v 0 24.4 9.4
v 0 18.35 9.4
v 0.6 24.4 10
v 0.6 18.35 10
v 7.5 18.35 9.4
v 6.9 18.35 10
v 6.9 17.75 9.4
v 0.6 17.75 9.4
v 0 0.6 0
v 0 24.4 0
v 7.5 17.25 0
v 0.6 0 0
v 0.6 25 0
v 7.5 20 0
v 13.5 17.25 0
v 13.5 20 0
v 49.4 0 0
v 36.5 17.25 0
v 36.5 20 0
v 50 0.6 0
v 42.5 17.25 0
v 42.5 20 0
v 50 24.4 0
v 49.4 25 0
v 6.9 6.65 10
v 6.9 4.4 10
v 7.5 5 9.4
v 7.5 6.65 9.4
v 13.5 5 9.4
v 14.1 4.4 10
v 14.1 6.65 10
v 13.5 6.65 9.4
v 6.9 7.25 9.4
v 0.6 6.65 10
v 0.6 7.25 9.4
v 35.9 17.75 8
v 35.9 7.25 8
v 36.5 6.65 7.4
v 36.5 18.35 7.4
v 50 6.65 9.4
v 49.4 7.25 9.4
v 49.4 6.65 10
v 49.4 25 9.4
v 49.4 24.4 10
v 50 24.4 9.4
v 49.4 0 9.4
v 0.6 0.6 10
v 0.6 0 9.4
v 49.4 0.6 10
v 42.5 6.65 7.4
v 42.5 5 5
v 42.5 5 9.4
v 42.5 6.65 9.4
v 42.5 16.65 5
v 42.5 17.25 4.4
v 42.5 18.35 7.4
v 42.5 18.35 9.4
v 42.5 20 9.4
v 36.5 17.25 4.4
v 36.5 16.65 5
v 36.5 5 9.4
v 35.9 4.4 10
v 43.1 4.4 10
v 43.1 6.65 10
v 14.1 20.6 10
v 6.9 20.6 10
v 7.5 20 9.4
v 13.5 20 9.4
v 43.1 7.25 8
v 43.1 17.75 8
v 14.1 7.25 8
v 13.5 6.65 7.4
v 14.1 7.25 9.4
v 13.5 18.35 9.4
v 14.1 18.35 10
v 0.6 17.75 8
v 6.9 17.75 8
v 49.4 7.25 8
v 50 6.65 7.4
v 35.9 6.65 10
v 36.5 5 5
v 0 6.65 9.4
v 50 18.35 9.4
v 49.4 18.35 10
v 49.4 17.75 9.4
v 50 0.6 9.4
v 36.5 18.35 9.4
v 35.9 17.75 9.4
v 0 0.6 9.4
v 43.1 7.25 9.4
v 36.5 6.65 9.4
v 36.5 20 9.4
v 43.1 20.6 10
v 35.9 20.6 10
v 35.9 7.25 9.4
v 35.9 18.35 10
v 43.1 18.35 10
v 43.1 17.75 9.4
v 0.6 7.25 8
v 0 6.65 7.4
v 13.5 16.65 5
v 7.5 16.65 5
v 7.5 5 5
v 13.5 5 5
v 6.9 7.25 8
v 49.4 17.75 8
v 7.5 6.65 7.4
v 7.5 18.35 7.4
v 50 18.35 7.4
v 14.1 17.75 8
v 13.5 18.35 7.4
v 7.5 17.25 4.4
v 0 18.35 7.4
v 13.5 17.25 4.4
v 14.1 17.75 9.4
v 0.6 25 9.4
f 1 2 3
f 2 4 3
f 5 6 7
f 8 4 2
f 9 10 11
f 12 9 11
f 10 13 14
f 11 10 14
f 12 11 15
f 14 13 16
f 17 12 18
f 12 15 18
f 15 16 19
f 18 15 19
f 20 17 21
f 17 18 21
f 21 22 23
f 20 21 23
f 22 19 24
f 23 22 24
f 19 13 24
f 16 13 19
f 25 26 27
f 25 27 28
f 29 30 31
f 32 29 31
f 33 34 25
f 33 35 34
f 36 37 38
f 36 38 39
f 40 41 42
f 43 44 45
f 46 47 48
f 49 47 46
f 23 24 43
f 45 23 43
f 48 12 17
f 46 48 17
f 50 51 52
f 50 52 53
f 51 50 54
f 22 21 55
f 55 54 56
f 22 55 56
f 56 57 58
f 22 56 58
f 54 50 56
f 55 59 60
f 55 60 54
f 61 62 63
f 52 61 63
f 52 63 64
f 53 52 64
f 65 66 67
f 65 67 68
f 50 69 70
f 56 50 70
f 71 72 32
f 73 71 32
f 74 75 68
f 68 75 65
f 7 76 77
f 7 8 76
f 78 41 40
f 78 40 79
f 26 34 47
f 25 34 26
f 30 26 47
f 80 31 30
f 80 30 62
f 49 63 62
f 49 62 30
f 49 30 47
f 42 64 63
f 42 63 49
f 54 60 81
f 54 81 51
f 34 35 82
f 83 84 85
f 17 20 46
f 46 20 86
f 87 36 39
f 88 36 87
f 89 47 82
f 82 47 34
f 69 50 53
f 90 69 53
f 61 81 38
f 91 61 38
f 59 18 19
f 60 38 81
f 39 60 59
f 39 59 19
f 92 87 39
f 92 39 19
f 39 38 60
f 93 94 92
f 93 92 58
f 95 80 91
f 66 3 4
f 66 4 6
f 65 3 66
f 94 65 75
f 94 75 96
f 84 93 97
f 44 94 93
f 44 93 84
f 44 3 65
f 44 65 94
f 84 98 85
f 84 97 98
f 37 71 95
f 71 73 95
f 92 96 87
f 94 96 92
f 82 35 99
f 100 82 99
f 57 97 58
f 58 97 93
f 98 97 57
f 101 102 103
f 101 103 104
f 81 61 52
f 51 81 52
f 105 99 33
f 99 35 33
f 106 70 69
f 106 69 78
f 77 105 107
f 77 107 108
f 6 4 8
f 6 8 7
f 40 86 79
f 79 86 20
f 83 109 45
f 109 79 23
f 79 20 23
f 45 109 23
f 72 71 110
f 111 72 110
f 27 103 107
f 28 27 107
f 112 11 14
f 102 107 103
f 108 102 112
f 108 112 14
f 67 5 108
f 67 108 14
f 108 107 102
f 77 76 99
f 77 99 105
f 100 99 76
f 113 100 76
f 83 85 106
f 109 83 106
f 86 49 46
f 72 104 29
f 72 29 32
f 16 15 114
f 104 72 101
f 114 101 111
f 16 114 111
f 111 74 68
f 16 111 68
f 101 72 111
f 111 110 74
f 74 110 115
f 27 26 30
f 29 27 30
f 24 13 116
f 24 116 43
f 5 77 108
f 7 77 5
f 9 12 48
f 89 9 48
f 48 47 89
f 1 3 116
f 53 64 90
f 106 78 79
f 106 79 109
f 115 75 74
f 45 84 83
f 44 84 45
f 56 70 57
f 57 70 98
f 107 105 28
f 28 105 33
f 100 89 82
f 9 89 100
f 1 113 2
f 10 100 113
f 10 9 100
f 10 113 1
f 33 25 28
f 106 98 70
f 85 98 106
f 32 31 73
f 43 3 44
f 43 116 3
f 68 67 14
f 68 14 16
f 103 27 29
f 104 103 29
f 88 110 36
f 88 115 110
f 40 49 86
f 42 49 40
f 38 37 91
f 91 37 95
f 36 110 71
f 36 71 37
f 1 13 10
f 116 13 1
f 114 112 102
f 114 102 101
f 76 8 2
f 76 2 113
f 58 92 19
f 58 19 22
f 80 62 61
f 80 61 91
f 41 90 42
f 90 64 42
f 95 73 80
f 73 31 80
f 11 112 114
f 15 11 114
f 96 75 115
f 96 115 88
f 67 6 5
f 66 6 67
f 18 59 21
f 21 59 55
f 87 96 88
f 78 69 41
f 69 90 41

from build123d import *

# Parameters (mm, degrees)
SKETCH_W        = 50
SKETCH_H        = 25
PAD_DEPTH       = 10
SKETCH001_W     = 50
SKETCH001_H     = 10.5
POCKET_DEPTH    = 2
SKETCH002_W     = 6
SKETCH002_H     = 15
POCKET001_DEPTH = 5
SKETCH003_W     = 6
SKETCH003_H     = 2.75
POCKET002_DEPTH = 5
CHAMFER_SIZE    = 0.6


with BuildPart() as part:
    # Sketch → Pad (new body)
    with BuildSketch(Plane.XY):
        with Locations((25, 12.5)):
            Rectangle(SKETCH_W, SKETCH_H)
    extrude(amount=PAD_DEPTH)

    # Sketch001 (on Face6 of Pad) → Pocket (cut)
    with BuildSketch(Plane.XY.offset(10)):
        with Locations((25, 12.5)):
            Rectangle(SKETCH001_W, SKETCH001_H)
    extrude(amount=-POCKET_DEPTH, mode=Mode.SUBTRACT)

    # Sketch002 (on Face9 of Pocket) → Pocket001 (cut)
    with BuildSketch(Plane.XY.offset(10)):
        with Locations((10.5, 12.5)):
            Rectangle(SKETCH002_W, SKETCH002_H)
        with Locations((39.5, 12.5)):
            Rectangle(SKETCH002_W, SKETCH002_H)
    extrude(amount=-POCKET001_DEPTH, mode=Mode.SUBTRACT)

    # Sketch003 (on Face24 of Pocket001) → Pocket002 (cut)
    with BuildSketch(Plane.XY.offset(5)):
        with Locations((10.5, 18.625)):
            Rectangle(SKETCH003_W, SKETCH003_H)
        with Locations((39.5, 18.625)):
            Rectangle(SKETCH003_W, SKETCH003_H)
    extrude(amount=-POCKET002_DEPTH, mode=Mode.SUBTRACT)

    # Chamfer
    chamfer_edges = [part.edges().sort_by_distance(p)[0] for p in [
        (25, 25, 10),
        (0, 21.375, 10),
        (3.75, 17.75, 10),
        (7.5, 18.875, 10),
        (10.5, 20, 10),
        (13.5, 18.875, 10),
        (25, 17.75, 10),
        (36.5, 18.875, 10),
        (39.5, 20, 10),
        (46.25, 17.75, 10),
        (50, 21.375, 10),
        (50, 12.5, 8),
        (50, 17.75, 9),
        (42.5, 12.5, 8),
        (46.25, 7.25, 10),
        (50, 7.25, 9),
        (42.5, 6.125, 10),
        (39.5, 5, 10),
        (36.5, 6.125, 10),
        (25, 7.25, 10),
        (13.5, 6.125, 10),
        (10.5, 5, 10),
        (7.5, 6.125, 10),
        (3.75, 7.25, 10),
        (7.5, 12.5, 8),
        (13.5, 12.5, 8),
        (36.5, 12.5, 8),
        (0, 12.5, 8),
        (0, 17.75, 9),
        (0, 7.25, 9),
        (0, 3.625, 10),
        (25, 0, 10),
        (50, 3.625, 10),
        (42.5, 18.875, 10),
        (7.5, 7.25, 9),
        (7.5, 17.75, 9),
        (13.5, 7.25, 9),
        (36.5, 7.25, 9),
        (36.5, 17.75, 9),
        (42.5, 17.75, 9),
        (42.5, 7.25, 9),
        (13.5, 17.75, 9),
        (0, 0, 5),
        (0, 25, 5),
        (50, 0, 5),
        (50, 25, 5),
        (39.5, 17.25, 5),
        (10.5, 17.25, 5),
    ]]
    chamfer(chamfer_edges, length=CHAMFER_SIZE)


solid = part.part
